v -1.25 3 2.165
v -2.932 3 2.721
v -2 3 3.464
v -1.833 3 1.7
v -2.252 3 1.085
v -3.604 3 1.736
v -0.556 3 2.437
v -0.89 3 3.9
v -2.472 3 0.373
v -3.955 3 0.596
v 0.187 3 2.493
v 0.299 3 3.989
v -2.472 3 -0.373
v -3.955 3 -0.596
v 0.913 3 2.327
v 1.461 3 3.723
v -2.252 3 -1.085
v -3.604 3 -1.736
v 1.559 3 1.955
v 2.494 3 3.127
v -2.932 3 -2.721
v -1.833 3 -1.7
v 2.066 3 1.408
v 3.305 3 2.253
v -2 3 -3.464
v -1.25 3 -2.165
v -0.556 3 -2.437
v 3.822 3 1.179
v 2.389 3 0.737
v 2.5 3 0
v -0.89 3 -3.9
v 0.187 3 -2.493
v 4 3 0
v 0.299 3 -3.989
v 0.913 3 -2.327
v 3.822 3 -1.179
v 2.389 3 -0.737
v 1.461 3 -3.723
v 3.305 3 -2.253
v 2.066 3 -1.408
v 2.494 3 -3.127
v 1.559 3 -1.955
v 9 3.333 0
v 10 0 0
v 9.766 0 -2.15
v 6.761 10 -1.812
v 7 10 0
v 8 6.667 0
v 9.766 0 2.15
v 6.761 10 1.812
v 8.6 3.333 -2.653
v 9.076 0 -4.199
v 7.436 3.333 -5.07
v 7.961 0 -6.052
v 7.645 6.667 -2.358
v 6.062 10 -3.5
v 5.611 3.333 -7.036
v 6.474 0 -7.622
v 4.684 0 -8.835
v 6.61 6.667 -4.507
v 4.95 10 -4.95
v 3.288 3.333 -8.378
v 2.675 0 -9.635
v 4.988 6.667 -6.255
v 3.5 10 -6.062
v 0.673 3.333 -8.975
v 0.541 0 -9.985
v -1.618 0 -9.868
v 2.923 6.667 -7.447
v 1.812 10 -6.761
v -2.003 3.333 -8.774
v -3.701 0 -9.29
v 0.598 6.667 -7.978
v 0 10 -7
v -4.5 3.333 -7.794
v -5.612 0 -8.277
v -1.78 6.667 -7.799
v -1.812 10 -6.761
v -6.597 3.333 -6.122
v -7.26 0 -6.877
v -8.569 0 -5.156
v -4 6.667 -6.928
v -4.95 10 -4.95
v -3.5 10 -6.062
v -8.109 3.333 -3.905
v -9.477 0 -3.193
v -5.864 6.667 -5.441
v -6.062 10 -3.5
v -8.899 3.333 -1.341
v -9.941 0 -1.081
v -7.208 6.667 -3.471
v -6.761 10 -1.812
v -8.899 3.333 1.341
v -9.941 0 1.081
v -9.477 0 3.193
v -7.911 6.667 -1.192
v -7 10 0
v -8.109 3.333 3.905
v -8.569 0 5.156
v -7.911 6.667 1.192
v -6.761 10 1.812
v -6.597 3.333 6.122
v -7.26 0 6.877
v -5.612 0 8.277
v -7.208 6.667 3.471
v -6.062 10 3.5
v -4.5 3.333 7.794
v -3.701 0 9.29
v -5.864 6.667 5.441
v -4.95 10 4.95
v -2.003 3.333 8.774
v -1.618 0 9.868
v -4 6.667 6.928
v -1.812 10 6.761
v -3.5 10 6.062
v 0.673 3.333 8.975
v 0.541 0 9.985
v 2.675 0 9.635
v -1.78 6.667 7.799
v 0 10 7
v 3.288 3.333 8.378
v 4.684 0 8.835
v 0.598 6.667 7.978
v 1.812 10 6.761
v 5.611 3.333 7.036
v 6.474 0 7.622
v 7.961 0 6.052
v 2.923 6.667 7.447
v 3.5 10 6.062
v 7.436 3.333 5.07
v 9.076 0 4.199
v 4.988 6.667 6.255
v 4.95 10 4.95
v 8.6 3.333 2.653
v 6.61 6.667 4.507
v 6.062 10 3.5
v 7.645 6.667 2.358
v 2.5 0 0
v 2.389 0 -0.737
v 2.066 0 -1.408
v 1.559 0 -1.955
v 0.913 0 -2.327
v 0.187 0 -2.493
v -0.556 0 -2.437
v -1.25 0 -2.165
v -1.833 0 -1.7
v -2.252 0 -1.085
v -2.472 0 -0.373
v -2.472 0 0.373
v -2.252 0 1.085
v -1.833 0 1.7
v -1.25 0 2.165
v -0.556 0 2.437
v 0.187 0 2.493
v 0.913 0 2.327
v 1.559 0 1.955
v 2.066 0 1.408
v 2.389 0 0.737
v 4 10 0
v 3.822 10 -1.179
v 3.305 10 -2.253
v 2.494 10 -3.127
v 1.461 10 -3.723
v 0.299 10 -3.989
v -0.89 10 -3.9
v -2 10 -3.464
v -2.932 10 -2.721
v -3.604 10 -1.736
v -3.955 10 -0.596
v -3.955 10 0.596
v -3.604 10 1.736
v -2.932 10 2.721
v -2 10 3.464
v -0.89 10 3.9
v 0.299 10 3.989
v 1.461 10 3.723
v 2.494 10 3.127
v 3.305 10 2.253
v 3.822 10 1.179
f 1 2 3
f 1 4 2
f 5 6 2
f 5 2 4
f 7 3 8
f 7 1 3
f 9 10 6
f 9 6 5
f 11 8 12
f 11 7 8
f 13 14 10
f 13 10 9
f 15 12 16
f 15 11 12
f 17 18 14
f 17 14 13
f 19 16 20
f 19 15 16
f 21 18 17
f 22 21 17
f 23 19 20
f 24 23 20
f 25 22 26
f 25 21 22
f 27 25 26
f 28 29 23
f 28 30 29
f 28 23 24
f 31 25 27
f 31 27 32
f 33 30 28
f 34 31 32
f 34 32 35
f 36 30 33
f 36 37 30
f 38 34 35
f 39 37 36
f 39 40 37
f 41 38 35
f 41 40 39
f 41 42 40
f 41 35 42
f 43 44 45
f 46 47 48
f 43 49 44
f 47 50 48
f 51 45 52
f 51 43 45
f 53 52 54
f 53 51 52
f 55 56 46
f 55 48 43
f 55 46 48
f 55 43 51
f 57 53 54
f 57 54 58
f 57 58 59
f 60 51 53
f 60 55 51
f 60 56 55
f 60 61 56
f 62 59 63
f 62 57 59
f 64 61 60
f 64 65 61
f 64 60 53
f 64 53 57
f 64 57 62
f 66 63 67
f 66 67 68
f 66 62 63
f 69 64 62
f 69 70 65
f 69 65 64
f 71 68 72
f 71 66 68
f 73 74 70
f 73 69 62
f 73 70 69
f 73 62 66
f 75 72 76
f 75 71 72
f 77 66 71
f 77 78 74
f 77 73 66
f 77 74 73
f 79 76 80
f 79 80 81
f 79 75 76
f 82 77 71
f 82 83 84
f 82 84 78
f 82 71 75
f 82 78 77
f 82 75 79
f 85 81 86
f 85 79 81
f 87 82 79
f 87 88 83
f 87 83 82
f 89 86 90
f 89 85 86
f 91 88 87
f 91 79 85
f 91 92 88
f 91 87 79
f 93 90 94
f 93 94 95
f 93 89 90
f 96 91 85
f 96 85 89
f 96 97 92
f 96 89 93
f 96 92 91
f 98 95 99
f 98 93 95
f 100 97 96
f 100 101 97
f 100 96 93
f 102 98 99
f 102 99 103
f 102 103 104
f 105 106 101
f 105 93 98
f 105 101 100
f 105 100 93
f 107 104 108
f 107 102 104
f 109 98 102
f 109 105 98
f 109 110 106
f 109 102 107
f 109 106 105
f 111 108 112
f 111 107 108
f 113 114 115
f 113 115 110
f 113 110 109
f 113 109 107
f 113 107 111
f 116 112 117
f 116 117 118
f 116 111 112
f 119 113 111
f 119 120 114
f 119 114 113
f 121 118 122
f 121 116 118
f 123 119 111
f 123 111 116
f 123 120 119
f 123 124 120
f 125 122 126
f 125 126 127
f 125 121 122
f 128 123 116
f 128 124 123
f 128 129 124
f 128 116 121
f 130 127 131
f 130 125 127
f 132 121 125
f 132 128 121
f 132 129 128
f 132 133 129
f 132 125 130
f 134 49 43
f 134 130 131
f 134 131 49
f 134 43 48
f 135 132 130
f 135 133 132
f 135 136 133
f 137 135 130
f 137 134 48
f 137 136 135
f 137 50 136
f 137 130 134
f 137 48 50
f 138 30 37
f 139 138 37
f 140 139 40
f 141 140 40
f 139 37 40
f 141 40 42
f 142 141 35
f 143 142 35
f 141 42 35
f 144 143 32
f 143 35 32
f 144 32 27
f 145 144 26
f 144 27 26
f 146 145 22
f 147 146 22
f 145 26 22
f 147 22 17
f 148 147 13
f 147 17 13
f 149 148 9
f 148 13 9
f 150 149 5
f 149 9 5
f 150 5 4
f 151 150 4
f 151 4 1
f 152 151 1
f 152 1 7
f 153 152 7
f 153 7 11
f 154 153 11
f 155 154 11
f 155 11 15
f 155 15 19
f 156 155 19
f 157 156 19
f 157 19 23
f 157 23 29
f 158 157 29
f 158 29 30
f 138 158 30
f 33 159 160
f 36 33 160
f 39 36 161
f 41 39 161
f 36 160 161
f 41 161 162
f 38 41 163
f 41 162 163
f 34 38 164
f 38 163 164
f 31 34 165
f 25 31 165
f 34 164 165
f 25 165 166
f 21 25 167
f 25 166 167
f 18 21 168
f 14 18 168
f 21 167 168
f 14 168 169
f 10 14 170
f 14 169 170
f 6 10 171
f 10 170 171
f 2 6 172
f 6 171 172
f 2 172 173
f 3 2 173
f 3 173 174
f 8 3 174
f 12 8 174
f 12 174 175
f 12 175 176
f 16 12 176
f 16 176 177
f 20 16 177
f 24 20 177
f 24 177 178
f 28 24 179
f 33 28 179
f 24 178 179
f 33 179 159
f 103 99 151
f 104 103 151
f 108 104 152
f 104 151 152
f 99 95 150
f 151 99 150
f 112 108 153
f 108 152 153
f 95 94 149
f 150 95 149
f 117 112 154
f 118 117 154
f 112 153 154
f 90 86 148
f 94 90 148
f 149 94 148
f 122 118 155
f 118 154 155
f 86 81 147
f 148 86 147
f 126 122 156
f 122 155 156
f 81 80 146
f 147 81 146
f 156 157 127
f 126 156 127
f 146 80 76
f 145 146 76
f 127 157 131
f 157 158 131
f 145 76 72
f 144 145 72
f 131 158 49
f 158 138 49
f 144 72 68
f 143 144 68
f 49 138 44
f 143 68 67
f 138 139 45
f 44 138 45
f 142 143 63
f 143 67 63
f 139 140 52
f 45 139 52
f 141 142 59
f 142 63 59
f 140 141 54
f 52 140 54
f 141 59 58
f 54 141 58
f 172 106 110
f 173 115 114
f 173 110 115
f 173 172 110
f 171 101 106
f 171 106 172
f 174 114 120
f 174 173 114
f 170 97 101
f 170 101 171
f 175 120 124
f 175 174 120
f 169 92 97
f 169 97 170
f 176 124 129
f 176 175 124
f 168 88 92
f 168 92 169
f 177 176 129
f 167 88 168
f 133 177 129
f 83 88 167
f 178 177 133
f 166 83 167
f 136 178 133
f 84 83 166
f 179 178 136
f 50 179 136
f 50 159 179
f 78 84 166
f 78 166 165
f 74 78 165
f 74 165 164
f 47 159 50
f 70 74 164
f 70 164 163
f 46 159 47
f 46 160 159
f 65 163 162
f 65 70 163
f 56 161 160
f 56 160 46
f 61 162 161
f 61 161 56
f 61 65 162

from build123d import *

# Parameters (mm, degrees)
SKETCH1_R           = 10
BOSS_EXTRUDE1_DEPTH = 10
BOSS_EXTRUDE1_TAPER = 16.69924423
SKETCH2_R           = 4
CUT_EXTRUDE1_DEPTH  = 7
SKETCH3_R           = 2.5
CUT_EXTRUDE2_DEPTH  = 4.0000001


with BuildPart() as part:
    # Sketch1 → Boss-Extrude1 (new body)
    with BuildSketch(Plane(origin=(0, 0, 0), x_dir=(1, 0, 0), z_dir=(0, 1, 0))):
        Circle(SKETCH1_R)
    extrude(amount=BOSS_EXTRUDE1_DEPTH, taper=BOSS_EXTRUDE1_TAPER)

    # Sketch2 → Cut-Extrude1 (cut)
    with BuildSketch(Plane(origin=(0, 10, 0), x_dir=(1, 0, 0), z_dir=(0, 1, 0))):
        Circle(SKETCH2_R)
    extrude(amount=-CUT_EXTRUDE1_DEPTH, mode=Mode.SUBTRACT)

    # Sketch3 → Cut-Extrude2 (cut, through all)
    with BuildSketch(Plane(origin=(0, 3, 0), x_dir=(1, 0, 0), z_dir=(0, 1, 0))):
        Circle(SKETCH3_R)
    extrude(amount=-CUT_EXTRUDE2_DEPTH, mode=Mode.SUBTRACT)


solid = part.part
